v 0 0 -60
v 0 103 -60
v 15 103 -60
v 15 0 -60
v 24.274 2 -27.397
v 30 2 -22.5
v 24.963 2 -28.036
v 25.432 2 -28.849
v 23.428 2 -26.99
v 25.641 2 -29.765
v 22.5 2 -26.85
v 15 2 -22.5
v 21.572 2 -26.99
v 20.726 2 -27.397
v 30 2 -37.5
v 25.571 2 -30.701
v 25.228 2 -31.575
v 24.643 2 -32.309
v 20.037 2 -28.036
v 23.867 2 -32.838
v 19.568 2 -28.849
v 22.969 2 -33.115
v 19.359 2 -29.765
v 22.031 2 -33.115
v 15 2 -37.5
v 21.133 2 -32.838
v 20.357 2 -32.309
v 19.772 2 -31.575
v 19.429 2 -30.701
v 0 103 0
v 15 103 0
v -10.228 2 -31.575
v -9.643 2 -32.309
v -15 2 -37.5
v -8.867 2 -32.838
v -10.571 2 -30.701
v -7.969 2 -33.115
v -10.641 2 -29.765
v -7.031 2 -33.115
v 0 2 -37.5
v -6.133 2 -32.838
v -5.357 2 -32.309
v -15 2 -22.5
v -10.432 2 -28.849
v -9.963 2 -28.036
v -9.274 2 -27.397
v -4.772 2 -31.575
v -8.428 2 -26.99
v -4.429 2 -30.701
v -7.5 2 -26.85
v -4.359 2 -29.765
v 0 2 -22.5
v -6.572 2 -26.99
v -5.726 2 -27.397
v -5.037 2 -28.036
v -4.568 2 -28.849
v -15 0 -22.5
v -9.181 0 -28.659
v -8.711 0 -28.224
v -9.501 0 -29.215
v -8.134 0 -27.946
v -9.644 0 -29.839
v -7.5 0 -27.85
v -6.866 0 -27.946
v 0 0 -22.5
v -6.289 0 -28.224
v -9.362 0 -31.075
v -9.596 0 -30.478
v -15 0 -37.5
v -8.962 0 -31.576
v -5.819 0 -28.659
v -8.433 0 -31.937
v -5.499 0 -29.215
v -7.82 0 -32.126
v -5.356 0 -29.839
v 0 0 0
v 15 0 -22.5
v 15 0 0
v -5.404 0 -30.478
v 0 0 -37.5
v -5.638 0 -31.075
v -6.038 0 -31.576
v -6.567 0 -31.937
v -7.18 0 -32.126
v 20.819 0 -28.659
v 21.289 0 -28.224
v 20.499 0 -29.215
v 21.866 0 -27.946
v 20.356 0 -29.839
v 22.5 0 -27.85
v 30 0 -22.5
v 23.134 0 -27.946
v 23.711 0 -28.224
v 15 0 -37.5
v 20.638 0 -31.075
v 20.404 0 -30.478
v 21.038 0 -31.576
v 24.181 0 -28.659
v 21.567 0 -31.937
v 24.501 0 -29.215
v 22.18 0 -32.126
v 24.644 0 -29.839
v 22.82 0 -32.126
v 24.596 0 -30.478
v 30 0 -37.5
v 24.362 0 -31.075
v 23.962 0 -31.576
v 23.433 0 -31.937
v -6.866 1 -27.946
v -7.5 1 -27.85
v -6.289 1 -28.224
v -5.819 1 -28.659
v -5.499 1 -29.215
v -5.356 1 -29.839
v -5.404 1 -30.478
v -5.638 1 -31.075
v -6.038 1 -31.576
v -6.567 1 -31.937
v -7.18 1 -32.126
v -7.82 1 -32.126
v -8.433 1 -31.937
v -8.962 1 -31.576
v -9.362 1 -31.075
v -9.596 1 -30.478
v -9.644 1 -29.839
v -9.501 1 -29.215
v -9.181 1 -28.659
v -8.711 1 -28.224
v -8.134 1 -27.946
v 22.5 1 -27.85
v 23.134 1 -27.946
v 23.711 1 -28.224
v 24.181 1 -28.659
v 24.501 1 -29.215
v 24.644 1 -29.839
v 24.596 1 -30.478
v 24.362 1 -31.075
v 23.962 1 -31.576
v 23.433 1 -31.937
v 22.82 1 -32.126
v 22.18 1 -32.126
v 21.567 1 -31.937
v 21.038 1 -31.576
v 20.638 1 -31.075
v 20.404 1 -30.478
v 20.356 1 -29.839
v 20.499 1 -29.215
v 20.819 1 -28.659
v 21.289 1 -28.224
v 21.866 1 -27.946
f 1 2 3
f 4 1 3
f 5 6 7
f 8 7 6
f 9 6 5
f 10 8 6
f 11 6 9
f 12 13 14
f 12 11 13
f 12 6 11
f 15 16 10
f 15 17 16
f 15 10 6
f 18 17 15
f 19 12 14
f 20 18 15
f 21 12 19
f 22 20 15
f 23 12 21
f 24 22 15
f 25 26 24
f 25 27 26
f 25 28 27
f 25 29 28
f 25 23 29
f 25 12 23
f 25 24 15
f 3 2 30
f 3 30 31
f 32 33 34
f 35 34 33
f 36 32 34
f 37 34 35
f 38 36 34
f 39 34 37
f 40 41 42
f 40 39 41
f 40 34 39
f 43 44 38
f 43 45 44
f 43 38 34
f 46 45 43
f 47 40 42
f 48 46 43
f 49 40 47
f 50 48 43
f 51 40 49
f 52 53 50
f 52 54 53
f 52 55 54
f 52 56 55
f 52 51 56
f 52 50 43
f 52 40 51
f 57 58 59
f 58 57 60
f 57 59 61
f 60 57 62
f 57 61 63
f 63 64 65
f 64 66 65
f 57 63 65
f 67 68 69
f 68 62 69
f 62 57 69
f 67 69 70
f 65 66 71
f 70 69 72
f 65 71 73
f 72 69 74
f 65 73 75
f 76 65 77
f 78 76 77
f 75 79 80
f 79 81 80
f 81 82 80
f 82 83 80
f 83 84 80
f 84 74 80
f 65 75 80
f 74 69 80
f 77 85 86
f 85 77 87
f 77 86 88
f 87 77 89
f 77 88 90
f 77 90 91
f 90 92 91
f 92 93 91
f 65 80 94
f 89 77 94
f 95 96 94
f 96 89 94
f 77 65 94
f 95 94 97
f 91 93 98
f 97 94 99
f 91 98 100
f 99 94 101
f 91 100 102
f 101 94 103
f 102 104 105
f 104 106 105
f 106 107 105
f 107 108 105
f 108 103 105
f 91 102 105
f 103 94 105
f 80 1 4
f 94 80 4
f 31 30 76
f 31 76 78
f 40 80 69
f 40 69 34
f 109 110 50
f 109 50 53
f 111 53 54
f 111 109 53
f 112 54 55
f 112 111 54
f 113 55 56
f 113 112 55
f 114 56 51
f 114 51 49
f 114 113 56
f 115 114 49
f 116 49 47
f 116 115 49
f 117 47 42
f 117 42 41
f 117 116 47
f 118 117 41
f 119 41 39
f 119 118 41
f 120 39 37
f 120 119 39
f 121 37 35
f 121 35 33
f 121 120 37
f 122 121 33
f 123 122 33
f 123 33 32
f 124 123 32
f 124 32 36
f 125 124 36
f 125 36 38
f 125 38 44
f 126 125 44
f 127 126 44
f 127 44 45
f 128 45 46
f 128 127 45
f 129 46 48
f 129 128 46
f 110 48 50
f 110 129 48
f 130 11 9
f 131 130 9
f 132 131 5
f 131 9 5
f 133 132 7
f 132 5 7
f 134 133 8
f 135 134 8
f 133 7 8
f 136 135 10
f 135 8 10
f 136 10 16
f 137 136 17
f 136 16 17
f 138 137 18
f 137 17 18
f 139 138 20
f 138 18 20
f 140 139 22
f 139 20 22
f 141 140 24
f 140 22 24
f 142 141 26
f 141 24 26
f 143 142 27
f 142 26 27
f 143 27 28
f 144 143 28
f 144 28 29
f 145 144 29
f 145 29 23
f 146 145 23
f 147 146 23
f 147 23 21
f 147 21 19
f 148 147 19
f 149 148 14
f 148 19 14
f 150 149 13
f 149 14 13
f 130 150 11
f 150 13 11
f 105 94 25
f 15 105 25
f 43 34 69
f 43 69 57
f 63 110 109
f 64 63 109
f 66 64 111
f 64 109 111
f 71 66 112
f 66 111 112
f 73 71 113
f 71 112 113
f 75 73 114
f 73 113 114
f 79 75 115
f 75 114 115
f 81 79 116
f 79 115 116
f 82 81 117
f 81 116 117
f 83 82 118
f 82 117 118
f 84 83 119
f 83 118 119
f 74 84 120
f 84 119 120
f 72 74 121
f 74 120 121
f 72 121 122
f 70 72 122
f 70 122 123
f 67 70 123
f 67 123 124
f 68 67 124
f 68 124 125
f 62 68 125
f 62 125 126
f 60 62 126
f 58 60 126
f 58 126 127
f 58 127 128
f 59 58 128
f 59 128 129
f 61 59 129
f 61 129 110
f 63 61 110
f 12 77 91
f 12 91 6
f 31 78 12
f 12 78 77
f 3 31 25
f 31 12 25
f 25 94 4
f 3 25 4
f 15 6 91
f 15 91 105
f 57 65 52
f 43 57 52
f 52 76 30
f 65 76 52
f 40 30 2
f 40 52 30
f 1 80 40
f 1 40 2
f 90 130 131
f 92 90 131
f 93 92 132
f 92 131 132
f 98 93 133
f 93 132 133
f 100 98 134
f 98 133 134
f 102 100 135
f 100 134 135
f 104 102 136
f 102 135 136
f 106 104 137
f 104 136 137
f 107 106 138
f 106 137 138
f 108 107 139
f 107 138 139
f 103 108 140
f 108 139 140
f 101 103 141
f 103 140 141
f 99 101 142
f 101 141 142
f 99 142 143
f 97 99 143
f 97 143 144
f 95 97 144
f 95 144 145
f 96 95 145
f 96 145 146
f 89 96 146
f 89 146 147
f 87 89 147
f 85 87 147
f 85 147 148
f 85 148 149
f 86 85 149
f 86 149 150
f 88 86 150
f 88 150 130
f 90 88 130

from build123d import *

# Parameters (mm, degrees)
SKETCH1_W           = 15
SKETCH1_H           = 60
BOSS_EXTRUDE1_DEPTH = 103
SKETCH2_W           = 15
SKETCH2_H           = 2
BOSS_EXTRUDE2_DEPTH = 15
SKETCH3_W           = 15
SKETCH3_H           = 2
BOSS_EXTRUDE3_DEPTH = 15
SKETCH4_R           = 2.15
CUT_EXTRUDE1_DEPTH  = 15
CHAMFER2_SIZE       = 1


with BuildPart() as part:
    # Sketch1 → Boss-Extrude1 (new body)
    with BuildSketch(Plane(origin=(0, 0, 0), x_dir=(1, 0, 0), z_dir=(0, 1, 0))):
        with Locations((7.5, 30)):
            Rectangle(SKETCH1_W, SKETCH1_H)
    extrude(amount=BOSS_EXTRUDE1_DEPTH)

    # Sketch2 → Boss-Extrude2 (add)
    with BuildSketch(Plane(origin=(15, 0, 0), x_dir=(0, 0, -1), z_dir=(1, 0, 0))):
        with Locations((30, 1)):
            Rectangle(SKETCH2_W, SKETCH2_H)
    extrude(amount=BOSS_EXTRUDE2_DEPTH)

    # Sketch3 → Boss-Extrude3 (add)
    with BuildSketch(Plane.ZY):
        with Locations((-30, 1)):
            Rectangle(SKETCH3_W, SKETCH3_H)
    extrude(amount=BOSS_EXTRUDE3_DEPTH)

    # Sketch4 → Cut-Extrude1 (cut)
    with BuildSketch(Plane(origin=(0, 2, 0), x_dir=(1, 0, 0), z_dir=(0, 1, 0))):
        with Locations(Location((22.5, 30, 0), (0, 0, 270))):
            Circle(SKETCH4_R)
        with Locations(Location((-7.5, 30, 0), (0, 0, 270))):
            Circle(SKETCH4_R)
    extrude(amount=-CUT_EXTRUDE1_DEPTH, mode=Mode.SUBTRACT)

    # Chamfer2
    chamfer2_edges = [part.edges().sort_by_distance(p)[0] for p in [
        (22.5, 2, -32.15),
        (-7.5, 2, -32.15),
    ]]
    chamfer(chamfer2_edges, length=CHAMFER2_SIZE)


solid = part.part
